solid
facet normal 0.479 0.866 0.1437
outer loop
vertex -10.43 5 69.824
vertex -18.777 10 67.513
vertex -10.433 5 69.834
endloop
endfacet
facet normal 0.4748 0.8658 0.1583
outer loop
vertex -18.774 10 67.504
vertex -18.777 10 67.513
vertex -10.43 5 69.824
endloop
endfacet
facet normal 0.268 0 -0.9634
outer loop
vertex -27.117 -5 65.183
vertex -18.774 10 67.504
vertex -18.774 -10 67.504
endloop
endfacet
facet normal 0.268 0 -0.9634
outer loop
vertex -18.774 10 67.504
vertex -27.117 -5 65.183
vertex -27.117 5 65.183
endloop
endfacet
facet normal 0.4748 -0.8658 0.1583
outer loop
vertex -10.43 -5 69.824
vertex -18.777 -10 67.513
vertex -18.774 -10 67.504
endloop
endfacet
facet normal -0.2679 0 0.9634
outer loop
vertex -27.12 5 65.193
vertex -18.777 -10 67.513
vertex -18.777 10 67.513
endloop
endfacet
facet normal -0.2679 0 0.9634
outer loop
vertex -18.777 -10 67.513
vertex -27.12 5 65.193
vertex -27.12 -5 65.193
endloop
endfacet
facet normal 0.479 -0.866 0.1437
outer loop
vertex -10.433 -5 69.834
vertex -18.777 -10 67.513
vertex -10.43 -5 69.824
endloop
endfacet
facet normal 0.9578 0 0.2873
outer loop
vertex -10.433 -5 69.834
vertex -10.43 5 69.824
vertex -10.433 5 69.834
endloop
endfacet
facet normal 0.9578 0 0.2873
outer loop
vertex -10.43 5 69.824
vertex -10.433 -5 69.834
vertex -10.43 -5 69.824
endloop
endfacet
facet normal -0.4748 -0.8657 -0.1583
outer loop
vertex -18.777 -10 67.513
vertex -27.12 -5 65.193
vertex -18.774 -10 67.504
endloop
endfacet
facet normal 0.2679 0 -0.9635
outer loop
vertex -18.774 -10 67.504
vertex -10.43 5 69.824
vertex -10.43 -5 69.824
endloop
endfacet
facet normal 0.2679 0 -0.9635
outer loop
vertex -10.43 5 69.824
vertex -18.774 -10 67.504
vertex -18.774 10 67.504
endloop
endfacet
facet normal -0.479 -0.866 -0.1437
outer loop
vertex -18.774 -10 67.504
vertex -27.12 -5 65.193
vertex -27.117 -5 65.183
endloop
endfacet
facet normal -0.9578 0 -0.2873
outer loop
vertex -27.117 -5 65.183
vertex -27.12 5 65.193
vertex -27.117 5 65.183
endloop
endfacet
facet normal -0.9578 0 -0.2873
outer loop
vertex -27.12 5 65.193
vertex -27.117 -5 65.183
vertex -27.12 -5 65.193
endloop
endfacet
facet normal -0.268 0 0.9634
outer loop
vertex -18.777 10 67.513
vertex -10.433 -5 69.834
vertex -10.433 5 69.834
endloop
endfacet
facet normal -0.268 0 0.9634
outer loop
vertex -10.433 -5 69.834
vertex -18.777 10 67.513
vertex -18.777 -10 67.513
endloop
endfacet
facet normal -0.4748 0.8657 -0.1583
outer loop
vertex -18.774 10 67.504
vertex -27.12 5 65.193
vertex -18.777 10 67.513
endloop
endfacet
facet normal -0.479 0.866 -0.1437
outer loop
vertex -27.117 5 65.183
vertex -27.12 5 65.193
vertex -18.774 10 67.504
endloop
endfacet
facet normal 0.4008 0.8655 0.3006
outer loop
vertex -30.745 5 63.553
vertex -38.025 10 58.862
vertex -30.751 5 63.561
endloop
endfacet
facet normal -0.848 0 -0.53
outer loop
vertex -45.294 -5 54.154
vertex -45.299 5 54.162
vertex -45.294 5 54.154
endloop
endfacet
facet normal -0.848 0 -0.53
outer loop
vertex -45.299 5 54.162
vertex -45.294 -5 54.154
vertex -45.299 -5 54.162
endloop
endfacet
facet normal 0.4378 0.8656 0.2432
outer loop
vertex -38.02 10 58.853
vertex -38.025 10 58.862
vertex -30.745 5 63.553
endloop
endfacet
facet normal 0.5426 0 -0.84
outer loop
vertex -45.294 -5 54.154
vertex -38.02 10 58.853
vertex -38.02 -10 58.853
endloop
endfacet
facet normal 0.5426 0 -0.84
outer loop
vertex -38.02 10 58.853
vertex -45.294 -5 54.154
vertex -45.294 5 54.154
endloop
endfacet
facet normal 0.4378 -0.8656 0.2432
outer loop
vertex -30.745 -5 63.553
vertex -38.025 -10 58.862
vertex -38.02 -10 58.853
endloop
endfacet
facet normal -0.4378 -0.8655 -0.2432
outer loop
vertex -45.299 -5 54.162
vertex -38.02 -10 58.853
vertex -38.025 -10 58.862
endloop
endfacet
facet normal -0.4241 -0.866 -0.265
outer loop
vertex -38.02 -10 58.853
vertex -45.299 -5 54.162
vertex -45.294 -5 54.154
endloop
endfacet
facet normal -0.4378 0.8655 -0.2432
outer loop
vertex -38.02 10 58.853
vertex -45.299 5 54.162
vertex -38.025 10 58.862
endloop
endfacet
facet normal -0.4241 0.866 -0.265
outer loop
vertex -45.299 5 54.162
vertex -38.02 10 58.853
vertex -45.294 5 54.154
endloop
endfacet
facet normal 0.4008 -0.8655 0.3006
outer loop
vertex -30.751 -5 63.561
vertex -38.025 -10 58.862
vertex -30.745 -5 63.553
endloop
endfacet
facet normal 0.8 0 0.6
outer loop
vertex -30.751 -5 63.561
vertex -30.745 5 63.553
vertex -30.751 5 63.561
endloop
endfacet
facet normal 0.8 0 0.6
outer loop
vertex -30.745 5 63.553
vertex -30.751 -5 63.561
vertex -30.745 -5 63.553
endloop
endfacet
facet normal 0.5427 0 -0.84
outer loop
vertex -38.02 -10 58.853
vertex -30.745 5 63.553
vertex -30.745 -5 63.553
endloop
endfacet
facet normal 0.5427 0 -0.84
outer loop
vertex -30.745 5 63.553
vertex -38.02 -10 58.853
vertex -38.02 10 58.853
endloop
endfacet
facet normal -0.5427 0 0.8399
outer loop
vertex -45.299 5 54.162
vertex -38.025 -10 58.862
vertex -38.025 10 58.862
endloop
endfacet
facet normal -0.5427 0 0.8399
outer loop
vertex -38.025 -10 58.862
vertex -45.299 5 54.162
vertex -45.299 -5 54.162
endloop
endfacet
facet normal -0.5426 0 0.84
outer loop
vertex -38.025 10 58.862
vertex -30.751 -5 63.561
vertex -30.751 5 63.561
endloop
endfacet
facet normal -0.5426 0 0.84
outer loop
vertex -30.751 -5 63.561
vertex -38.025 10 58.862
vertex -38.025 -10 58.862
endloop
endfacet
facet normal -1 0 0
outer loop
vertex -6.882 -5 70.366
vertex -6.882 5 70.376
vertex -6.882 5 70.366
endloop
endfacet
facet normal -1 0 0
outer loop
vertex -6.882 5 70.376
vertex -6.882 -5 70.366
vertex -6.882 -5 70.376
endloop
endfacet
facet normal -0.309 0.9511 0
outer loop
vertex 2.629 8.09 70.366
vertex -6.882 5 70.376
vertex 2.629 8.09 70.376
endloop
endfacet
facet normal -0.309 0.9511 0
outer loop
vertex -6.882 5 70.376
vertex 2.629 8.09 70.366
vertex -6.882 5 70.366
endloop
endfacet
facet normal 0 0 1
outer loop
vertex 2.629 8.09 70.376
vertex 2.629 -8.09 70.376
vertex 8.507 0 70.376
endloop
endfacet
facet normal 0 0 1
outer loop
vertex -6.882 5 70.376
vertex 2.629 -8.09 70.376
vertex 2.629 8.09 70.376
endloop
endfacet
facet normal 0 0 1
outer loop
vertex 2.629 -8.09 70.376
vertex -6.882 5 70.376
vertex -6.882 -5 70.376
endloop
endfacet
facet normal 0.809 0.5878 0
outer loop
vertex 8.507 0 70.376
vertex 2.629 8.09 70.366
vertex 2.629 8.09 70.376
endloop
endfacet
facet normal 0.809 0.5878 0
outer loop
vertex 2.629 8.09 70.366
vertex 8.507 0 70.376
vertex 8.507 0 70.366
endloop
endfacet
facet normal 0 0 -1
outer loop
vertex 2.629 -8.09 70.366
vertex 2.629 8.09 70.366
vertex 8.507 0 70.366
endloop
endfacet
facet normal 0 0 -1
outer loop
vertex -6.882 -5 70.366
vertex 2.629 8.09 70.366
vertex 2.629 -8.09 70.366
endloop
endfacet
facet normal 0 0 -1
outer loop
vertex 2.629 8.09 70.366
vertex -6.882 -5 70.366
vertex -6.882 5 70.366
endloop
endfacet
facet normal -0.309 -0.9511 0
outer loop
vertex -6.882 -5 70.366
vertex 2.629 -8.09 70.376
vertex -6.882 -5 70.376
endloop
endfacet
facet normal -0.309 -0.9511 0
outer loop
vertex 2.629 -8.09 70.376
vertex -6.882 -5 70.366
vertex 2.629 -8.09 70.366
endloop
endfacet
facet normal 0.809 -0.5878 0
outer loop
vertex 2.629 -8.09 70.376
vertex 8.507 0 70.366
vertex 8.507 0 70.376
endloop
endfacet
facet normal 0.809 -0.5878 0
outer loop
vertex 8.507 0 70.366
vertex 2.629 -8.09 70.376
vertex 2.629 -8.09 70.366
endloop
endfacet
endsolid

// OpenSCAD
// subdividing hexagonal tiles to get more holes
// params to tweak
thick=.01;
side = 10;
shell_thick = 2;
shell_dr = 4;
hex_layers = 2;


// empirical constants (would be great to have exact formulas)
coeff_side_r = 2.35*hex_layers;     // ratio between polygon side and final radius
coeff_pent_delta_side = 0.03;
ang1 = 37.4;
ang2 = 11.3;
ang3 = 4.5;

// derived values
pent_a = 180 / 5;
hex_a = 180 / 6;

// radius and height of the right pentagone
pent_r = side / (2*sin(pent_a));
pent_h = pent_r * sin(54);

// radius and height of the right hexagone
hex_r = side / (2*sin(hex_a));
hex_h = hex_r * sin(60);

// angles of the various parts of the tiling
// TODO: fix those calculations for subdivided case
perimeter = 2*(pent_h + 4*hex_h*hex_layers + pent_h + pent_r + side + pent_r);
side_a = 360 * side / perimeter;
pent_r_a = 360 * pent_r / perimeter;
pent_h_a = 360 * pent_h / perimeter;
hex_r_a = 360 * hex_r / perimeter;
hex_h_a = 360 * hex_h / perimeter;

// radius of the sphere we're tiling
radius = side * coeff_side_r;
radius2 = perimeter / PI;
pent_delta = side * coeff_pent_delta_side;


// https://math.stackexchange.com/questions/2029958/numbering-a-spherical-grid-of-pentagons-and-hexagons-so-neighbours-are-easily

// https://www.americanscientist.org/article/the-topology-and-combinatorics-of-soccer-balls#:~:text=Twelve%20pentagons%20and%2020%20hexagons,as%20the%20standard%20soccer%20ball.


module hex_tile(side = side, thick=thick, tile_a=0) {
    angles = [for (i = [0:5]) 30 + i*(2*hex_a)];
    coords = [for (th=angles) [hex_r * cos(th), hex_r * sin(th)]];
    rotate([0, 0, tile_a])
    linear_extrude(thick)
        polygon(coords);
}


module pent_tile(side = side, thick=thick, tile_a=0) {
    angles = [for (i = [0:4]) i*(2*pent_a)];
    coords = [for (th=angles) [pent_r * cos(th), pent_r * sin(th)]];
    color("lightblue")
    rotate([0, 0, tile_a])
    linear_extrude(thick)
        polygon(coords);
}


// triangle made from hexagonal tiles
module hex_triag(layers = hex_layers) {
    
    for (layer = [0:layers-1]) {
        echo("Layer", layer);
        rotate([0, -pent_h - hex_h - 2*hex_h*layer, 0])
        translate([0, 0, radius2])
            hex_tile();

        for (t = [0:layer+1]) {
            echo("Tile", t);
            
        }
    }
}


module ball() {
    // center
    translate([0, 0, radius2+pent_delta])
        pent_tile();
/*
    mirror([0, 0, 1])
    translate([0, 0, radius+pent_delta])
        pent_tile(tile_a=pent_a);
*/
    hex_triag();

    // layer 1
    for (i = [0:4]) {
        rotate([0, -ang1, i*pent_a*2])
        translate([0, 0, radius])
//            hex_tile();
        ;
/*
        mirror([0, 0, 1])
        rotate([0, ang1, i*pent_a*2])
        translate([0, 0, radius])
            hex_tile();
*/
    }    
/*
    // center 2
    for (i = [1:2:9]) {
        rotate([0, -ang1*2+ang2, i*pent_a])
        translate([0, 0, radius+pent_delta])
            pent_tile();
        mirror([0, 0, 1])
        rotate([0, -ang1*2+ang2, (i-1)*pent_a])
        translate([0, 0, radius+pent_delta])
            pent_tile();
    }

    // layer 2
    for (i = [1:2:9]) {
        rotate([0, -ang1*2-ang3, pent_a*(i-1)])
        translate([0, 0, radius])
            hex_tile();
        mirror([0, 0, 1])
        rotate([0, -ang1*2-ang3, pent_a*i])
        translate([0, 0, radius])
            hex_tile();
    }
*/
}


module shell(dr=shell_dr) {
    difference() {
        sphere(radius + dr, $fn=100);
        sphere(radius + dr - shell_thick, $fn=100);
    }
}


module diff_shell() {
    difference() {
        shell();
        ball();
    }
}


ball();
//diff_shell();
